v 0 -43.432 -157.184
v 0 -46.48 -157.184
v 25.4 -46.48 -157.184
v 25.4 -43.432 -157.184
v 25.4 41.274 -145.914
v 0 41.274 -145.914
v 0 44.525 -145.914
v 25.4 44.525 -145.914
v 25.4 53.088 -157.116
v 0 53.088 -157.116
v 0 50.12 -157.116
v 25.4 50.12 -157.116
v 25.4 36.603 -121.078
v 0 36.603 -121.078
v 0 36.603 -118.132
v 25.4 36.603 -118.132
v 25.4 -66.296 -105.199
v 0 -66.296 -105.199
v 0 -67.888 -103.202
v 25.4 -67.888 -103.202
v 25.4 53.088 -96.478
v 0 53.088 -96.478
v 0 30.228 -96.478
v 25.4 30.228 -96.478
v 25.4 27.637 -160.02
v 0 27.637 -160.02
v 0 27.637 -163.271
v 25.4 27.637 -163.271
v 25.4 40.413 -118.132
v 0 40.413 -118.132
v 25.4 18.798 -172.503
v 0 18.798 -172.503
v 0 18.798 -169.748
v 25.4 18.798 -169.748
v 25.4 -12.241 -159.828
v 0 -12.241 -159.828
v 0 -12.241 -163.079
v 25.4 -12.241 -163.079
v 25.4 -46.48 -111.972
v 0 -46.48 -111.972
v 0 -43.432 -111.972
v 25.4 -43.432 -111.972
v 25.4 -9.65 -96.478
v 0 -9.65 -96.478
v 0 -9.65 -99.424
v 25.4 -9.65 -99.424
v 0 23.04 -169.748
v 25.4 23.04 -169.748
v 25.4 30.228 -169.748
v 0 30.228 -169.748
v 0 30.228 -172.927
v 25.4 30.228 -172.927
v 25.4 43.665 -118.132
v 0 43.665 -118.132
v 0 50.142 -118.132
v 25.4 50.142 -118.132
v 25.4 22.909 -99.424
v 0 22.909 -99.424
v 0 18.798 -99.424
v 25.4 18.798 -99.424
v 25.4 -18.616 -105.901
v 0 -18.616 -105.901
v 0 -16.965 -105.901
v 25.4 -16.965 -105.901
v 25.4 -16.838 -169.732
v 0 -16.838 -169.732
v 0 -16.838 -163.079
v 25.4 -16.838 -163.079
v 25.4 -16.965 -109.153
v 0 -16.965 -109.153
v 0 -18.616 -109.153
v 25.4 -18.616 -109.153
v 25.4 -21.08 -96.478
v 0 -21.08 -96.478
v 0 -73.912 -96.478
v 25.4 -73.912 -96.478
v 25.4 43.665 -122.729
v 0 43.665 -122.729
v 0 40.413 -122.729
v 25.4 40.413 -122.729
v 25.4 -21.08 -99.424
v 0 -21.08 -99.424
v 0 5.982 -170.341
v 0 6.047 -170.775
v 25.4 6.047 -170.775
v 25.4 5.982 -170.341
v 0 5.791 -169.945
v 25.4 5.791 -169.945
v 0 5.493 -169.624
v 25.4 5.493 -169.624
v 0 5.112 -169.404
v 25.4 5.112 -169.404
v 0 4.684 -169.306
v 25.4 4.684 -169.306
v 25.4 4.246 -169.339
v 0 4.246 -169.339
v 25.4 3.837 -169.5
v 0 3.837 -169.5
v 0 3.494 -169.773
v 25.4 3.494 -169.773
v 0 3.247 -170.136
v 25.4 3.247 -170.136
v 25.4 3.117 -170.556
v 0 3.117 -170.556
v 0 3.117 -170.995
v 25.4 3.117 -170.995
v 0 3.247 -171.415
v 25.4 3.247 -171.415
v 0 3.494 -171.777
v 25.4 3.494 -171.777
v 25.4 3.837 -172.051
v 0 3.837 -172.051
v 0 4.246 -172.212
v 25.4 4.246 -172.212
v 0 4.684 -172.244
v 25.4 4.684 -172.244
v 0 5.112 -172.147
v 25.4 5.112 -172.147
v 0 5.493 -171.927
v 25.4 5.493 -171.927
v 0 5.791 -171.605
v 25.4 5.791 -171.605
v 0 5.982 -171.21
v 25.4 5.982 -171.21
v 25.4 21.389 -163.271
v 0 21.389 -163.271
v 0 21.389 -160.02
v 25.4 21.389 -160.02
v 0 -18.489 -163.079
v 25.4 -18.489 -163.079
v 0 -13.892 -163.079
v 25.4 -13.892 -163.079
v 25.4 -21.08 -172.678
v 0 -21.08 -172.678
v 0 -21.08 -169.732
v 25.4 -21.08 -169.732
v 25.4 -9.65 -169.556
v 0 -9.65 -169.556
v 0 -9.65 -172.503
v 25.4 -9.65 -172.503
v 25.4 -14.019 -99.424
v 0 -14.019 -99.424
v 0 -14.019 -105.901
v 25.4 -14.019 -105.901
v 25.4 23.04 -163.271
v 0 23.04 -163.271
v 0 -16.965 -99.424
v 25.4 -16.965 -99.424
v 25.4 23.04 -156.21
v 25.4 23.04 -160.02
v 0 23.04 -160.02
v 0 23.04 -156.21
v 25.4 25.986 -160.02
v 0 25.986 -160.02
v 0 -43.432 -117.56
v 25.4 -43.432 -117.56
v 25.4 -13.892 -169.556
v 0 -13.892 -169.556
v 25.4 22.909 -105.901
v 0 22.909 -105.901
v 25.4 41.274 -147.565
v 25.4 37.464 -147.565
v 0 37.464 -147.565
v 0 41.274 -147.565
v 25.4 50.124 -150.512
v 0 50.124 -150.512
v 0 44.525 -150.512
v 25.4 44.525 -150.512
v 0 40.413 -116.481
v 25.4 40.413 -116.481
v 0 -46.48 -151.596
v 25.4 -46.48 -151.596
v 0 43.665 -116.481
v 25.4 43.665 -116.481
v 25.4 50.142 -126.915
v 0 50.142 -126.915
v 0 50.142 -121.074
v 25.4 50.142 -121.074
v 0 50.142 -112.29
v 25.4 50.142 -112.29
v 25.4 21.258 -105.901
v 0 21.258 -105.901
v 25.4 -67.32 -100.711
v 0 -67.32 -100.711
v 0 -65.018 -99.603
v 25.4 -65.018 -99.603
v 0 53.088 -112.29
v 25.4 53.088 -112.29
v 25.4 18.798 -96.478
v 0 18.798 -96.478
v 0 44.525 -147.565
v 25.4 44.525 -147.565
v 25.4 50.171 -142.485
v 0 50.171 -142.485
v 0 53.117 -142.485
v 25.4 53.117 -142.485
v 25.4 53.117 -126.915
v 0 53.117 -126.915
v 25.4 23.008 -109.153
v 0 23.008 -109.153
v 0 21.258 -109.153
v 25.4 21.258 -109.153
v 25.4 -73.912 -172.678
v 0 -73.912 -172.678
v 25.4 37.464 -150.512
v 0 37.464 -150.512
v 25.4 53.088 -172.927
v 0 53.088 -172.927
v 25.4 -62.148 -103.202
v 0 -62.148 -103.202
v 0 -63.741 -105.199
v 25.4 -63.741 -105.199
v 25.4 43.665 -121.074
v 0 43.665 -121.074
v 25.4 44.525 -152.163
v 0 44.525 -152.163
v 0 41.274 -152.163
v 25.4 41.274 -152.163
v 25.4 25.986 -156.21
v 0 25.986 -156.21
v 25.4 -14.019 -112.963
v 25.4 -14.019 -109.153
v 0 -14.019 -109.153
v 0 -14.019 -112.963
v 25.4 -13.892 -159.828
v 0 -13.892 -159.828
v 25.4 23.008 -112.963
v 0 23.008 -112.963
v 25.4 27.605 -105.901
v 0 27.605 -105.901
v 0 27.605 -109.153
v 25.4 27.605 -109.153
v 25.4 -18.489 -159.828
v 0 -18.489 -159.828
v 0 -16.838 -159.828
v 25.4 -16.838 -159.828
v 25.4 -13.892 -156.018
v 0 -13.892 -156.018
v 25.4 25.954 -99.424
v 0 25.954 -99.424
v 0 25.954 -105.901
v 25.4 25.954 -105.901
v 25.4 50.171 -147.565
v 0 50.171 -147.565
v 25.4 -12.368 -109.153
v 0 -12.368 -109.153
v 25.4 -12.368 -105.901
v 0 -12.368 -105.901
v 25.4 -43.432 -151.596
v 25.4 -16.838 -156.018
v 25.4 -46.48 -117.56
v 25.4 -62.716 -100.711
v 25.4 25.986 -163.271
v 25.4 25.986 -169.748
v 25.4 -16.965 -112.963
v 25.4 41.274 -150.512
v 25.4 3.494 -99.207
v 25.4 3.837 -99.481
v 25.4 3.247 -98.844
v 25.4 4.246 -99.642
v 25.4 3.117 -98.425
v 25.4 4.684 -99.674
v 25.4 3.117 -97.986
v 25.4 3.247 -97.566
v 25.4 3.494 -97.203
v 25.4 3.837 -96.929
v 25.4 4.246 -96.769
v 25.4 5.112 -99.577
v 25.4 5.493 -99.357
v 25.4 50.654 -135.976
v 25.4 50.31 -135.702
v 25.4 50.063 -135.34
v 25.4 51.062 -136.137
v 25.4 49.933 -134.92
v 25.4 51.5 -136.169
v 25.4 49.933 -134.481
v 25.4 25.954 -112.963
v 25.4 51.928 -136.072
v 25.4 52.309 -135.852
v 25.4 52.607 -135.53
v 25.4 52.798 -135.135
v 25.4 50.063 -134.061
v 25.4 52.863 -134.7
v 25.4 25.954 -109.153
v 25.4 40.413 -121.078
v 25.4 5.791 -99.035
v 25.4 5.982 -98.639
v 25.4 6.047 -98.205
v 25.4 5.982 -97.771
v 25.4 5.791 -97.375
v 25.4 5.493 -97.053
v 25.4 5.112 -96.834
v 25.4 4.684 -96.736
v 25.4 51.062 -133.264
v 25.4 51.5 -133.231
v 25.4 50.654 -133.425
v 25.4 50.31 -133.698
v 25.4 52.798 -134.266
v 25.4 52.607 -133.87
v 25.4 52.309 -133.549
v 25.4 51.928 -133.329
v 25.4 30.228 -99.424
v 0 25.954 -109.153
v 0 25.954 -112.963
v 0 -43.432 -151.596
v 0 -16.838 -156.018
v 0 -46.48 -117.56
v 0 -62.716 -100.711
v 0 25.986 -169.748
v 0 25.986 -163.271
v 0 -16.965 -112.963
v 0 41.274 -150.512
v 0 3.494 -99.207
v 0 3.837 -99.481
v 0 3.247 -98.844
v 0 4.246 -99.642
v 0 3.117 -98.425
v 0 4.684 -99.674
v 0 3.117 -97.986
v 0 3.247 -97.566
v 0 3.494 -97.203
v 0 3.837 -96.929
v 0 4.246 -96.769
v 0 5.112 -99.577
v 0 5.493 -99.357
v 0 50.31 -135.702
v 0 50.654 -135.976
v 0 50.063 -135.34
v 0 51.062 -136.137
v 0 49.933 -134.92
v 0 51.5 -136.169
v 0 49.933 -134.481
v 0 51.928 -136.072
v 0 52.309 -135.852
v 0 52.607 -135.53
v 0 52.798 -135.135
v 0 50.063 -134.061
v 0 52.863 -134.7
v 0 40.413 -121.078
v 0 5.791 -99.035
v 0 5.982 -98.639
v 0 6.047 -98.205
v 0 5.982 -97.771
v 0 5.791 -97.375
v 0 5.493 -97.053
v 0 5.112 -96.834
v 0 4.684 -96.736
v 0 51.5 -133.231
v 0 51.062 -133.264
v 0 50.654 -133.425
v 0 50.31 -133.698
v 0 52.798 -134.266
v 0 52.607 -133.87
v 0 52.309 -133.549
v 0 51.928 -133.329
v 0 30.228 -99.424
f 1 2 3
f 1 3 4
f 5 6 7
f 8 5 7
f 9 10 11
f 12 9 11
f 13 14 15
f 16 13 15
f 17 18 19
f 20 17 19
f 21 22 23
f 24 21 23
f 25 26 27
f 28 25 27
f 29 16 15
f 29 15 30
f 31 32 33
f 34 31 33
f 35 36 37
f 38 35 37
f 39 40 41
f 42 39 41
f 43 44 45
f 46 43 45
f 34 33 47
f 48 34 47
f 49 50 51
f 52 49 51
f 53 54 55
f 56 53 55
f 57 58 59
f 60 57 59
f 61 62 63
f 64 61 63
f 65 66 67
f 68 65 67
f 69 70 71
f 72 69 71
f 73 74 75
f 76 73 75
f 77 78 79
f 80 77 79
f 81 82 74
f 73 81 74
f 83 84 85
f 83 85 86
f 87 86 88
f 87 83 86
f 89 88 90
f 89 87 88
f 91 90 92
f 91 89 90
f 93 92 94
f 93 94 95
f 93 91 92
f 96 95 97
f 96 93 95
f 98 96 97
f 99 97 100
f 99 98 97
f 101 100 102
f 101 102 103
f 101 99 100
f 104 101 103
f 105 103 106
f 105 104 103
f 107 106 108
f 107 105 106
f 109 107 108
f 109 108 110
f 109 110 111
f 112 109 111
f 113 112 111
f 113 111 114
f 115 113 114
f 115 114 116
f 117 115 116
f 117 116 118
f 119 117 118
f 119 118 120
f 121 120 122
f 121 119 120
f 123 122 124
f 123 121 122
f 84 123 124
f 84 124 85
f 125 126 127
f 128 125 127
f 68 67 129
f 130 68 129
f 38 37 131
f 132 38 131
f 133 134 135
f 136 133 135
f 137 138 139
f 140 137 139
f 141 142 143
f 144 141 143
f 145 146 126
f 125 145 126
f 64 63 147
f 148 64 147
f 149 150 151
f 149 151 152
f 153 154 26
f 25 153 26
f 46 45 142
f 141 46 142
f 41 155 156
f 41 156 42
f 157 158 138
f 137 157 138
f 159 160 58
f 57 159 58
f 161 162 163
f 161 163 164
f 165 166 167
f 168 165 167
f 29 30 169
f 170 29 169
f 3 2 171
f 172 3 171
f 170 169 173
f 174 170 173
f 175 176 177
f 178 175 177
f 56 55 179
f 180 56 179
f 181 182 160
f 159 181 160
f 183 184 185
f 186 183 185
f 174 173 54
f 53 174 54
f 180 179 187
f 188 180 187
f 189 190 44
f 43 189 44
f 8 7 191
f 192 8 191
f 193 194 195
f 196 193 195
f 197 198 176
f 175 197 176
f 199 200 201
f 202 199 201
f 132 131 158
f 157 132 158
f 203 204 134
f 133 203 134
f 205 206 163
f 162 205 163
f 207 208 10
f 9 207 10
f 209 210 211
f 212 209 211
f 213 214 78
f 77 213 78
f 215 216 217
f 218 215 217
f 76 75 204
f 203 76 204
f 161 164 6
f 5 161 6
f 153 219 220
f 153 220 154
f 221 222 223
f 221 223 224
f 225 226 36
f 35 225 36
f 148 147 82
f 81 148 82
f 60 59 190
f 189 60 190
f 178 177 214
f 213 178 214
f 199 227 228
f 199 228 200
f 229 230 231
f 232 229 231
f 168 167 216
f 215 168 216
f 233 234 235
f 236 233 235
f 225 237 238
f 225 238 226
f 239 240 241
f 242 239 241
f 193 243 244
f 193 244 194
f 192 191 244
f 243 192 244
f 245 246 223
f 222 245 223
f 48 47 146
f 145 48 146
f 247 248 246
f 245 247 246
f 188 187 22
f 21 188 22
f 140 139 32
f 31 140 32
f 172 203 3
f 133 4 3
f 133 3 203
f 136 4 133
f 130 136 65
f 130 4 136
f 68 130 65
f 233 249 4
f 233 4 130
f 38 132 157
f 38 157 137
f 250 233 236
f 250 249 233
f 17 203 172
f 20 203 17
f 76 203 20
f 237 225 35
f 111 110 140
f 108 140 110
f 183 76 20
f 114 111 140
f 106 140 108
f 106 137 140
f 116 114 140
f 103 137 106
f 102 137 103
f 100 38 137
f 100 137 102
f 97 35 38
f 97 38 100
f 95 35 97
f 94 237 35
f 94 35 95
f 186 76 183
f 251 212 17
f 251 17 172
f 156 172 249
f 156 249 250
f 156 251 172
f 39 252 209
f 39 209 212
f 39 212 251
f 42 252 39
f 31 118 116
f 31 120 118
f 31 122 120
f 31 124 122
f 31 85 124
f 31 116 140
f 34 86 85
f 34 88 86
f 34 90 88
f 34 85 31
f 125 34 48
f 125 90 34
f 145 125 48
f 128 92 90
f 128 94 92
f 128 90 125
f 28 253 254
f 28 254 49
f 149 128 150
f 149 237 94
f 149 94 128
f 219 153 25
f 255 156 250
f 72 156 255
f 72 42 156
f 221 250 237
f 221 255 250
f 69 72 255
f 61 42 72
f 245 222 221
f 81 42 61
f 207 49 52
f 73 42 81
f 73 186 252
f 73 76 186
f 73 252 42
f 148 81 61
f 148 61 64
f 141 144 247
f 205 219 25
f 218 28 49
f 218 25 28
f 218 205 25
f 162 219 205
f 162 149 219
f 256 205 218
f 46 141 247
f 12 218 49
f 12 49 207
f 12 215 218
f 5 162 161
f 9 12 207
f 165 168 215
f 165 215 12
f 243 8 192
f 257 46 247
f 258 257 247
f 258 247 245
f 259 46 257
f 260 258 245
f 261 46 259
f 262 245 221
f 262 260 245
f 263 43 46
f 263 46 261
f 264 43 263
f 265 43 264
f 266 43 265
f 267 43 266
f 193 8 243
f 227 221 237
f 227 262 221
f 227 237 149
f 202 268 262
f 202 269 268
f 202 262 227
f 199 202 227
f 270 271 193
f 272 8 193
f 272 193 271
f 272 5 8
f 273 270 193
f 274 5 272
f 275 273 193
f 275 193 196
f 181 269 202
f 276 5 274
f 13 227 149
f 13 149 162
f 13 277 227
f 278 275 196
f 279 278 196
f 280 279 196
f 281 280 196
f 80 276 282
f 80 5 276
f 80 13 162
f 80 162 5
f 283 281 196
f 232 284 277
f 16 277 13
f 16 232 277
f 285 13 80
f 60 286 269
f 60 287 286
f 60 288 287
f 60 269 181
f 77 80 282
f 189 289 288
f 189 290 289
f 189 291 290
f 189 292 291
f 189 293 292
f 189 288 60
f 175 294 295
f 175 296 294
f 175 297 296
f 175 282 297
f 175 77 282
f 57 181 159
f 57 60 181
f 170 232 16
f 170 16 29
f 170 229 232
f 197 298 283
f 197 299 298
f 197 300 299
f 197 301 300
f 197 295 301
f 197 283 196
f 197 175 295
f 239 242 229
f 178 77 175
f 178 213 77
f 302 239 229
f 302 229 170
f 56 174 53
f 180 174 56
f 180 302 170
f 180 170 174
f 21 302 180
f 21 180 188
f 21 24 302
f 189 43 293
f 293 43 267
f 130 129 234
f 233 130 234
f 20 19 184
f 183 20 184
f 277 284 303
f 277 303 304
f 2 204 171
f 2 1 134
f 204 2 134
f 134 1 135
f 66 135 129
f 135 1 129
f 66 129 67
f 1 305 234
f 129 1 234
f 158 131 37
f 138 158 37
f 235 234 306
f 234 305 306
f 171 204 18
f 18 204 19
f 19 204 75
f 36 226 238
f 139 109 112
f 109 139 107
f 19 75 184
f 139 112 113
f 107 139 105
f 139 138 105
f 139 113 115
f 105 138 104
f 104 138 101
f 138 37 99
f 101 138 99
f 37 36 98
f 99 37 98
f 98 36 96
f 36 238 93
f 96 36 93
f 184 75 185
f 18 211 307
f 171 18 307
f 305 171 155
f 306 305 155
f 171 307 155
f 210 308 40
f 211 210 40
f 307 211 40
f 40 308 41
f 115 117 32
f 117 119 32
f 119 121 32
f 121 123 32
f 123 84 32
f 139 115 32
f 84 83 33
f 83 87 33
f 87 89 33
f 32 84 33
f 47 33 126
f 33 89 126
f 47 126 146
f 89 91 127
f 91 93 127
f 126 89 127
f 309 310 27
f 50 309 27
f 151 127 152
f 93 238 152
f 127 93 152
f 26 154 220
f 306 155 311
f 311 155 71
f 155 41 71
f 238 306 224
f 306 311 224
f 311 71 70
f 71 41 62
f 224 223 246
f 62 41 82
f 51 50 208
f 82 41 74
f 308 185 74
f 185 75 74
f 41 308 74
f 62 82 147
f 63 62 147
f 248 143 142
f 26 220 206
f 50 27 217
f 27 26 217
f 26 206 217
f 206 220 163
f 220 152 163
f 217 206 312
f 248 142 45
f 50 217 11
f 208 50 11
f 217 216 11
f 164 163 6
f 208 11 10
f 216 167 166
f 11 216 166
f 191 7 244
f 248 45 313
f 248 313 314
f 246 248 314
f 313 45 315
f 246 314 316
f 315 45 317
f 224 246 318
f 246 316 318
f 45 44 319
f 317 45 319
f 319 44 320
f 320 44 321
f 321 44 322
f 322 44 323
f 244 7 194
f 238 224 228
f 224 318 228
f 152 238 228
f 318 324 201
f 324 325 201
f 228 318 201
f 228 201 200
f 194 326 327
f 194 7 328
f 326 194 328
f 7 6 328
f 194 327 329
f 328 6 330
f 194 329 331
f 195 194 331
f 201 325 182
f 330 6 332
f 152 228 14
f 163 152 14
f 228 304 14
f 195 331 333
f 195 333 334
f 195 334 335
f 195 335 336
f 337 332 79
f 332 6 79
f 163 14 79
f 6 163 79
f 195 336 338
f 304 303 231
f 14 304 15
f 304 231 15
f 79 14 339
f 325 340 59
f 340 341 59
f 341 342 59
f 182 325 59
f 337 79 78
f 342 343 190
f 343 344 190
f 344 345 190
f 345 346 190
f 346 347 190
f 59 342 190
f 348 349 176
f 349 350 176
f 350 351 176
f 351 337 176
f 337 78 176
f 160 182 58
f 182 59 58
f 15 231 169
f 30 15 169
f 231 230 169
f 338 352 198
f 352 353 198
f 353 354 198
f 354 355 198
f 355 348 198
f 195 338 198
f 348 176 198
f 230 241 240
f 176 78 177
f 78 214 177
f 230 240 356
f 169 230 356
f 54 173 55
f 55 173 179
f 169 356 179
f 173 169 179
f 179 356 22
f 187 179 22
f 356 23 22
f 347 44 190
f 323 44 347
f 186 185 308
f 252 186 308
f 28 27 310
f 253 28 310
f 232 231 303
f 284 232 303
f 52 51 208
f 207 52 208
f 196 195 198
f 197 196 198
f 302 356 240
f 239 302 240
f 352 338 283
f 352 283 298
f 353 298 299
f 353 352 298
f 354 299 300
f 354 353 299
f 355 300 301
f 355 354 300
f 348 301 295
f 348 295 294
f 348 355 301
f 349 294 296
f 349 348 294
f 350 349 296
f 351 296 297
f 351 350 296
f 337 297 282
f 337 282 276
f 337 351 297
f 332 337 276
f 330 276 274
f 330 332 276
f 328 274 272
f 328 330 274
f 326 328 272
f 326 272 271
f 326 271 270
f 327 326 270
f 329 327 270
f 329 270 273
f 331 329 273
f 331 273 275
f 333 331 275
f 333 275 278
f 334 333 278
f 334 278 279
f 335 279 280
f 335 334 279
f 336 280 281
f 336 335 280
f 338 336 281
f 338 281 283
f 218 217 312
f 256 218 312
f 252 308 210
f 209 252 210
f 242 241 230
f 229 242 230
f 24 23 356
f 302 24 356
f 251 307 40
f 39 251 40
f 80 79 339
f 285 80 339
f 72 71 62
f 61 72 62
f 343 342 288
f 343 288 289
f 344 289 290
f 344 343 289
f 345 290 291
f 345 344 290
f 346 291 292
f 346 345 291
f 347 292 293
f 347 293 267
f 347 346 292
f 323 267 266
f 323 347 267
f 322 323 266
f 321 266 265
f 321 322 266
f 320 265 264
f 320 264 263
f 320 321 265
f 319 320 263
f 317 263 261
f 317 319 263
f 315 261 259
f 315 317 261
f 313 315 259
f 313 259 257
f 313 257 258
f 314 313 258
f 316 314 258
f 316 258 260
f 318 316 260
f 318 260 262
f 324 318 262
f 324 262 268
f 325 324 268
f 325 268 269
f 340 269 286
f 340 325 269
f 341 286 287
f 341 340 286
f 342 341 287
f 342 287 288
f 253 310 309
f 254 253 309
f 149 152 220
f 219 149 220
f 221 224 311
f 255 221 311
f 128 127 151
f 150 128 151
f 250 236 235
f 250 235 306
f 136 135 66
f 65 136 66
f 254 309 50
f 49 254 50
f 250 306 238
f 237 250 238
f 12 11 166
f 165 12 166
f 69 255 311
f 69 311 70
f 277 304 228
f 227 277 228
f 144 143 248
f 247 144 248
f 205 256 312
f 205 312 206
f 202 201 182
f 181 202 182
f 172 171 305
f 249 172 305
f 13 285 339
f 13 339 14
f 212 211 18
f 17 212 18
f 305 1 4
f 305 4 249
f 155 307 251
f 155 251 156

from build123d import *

# Parameters (mm, degrees)
F0_W     = 3.048
F0_H     = 5.588
F0_R     = 1.4732
F1_DEPTH = 25.4


with BuildPart() as f1:
    # F0 (on Right) → F1 (new body)
    with BuildSketch(Plane.YZ):
        Polygon((-44.894837, -69.046037), (-72.387907, -69.046037), (-72.387907, -145.246037), (-19.555907, -145.246037), (-19.555907, -142.299637), (-15.314107, -142.299637), (-15.314107, -135.647137), (-16.965107, -135.647137), (-16.965107, -132.395937), (-15.314107, -132.395937), (-15.314107, -128.585937), (-12.367707, -128.585937), (-12.367707, -132.395937), (-10.716707, -132.395937), (-10.716707, -135.647137), (-12.367707, -135.647137), (-12.367707, -142.124137), (-8.125907, -142.124137), (-8.125907, -145.070537), (20.322093, -145.070537), (20.322093, -142.316303), (24.563893, -142.316303), (24.563893, -135.839303), (22.912893, -135.839303), (22.912893, -132.588103), (24.563893, -132.588103), (24.563893, -128.778103), (27.510293, -128.778103), (27.510293, -132.588103), (29.161293, -132.588103), (29.161293, -135.839303), (27.510293, -135.839303), (27.510293, -142.316303), (31.752093, -142.316303), (31.752093, -145.495363), (54.612093, -145.495363), (54.612093, -129.683863), (51.644098, -129.683863), (51.647506, -123.079863), (46.049349, -123.079863), (46.049349, -124.730863), (42.798149, -124.730863), (42.798149, -123.079863), (38.988149, -123.079863), (38.988149, -120.133463), (42.798149, -120.133463), (42.798149, -118.482463), (46.049349, -118.482463), (46.049349, -120.133463), (51.694974, -120.133463), (51.694974, -115.053463), (54.641374, -115.053463), (54.641374, -99.483097), (51.665693, -99.483097), (51.665693, -93.642298), (45.188693, -93.642298), (45.188693, -95.296937), (41.937493, -95.296937), (41.937493, -93.645937), (38.127493, -93.645937), (38.127493, -90.699537), (41.937493, -90.699537), (41.937493, -89.048537), (45.188693, -89.048537), (45.188693, -90.699537), (51.665693, -90.699537), (51.665693, -84.857537), (54.612093, -84.857537), (54.612093, -71.992437), (54.612093, -69.046037), (31.752093, -69.046037), (31.752093, -71.992437), (27.478132, -71.992437), (27.478132, -78.469437), (29.129132, -78.469437), (29.129132, -81.720637), (27.478132, -81.720637), (27.478132, -85.530637), (24.531732, -85.530637), (24.531732, -81.720637), (22.782468, -81.720637), (22.782468, -78.469437), (24.433468, -78.469437), (24.433468, -71.992437), (20.322093, -71.992437), (20.322093, -69.046037), (-8.125907, -69.046037), (-8.125907, -71.992437), (-12.494707, -71.992437), (-12.494707, -78.469437), (-10.843707, -78.469437), (-10.843707, -81.720637), (-12.494707, -81.720637), (-12.494707, -85.530637), (-15.441107, -85.530637), (-15.441107, -81.720637), (-17.092107, -81.720637), (-17.092107, -78.469437), (-15.441107, -78.469437), (-15.441107, -71.992437), (-19.555907, -71.992437), (-19.555907, -69.046037), align=None)
        with Locations((-43.431907, -126.958037)):
            Rectangle(F0_W, F0_H, mode=Mode.SUBTRACT)
        with Locations((6.098093, -143.343337)):
            Circle(F0_R, mode=Mode.SUBTRACT)
        with Locations((-43.431907, -87.334037)):
            Rectangle(F0_W, F0_H, mode=Mode.SUBTRACT)
        with Locations((52.914174, -107.268363)):
            Circle(F0_R, mode=Mode.SUBTRACT)
        Polygon((-60.623973, -75.769594), (-62.216802, -77.766938), (-64.771501, -77.766938), (-66.36433, -75.769594), (-65.795856, -73.278946), (-63.494152, -72.170503), (-61.192447, -73.278946), align=None, mode=Mode.SUBTRACT)
        with Locations((6.098093, -70.773237)):
            Circle(F0_R, mode=Mode.SUBTRACT)
    extrude(amount=F1_DEPTH)


with BuildPart() as f1_1:
    # F2: moved
    add(f1.part.moved(Location((0, -1.524, -27.432))))


solid = f1_1.part
